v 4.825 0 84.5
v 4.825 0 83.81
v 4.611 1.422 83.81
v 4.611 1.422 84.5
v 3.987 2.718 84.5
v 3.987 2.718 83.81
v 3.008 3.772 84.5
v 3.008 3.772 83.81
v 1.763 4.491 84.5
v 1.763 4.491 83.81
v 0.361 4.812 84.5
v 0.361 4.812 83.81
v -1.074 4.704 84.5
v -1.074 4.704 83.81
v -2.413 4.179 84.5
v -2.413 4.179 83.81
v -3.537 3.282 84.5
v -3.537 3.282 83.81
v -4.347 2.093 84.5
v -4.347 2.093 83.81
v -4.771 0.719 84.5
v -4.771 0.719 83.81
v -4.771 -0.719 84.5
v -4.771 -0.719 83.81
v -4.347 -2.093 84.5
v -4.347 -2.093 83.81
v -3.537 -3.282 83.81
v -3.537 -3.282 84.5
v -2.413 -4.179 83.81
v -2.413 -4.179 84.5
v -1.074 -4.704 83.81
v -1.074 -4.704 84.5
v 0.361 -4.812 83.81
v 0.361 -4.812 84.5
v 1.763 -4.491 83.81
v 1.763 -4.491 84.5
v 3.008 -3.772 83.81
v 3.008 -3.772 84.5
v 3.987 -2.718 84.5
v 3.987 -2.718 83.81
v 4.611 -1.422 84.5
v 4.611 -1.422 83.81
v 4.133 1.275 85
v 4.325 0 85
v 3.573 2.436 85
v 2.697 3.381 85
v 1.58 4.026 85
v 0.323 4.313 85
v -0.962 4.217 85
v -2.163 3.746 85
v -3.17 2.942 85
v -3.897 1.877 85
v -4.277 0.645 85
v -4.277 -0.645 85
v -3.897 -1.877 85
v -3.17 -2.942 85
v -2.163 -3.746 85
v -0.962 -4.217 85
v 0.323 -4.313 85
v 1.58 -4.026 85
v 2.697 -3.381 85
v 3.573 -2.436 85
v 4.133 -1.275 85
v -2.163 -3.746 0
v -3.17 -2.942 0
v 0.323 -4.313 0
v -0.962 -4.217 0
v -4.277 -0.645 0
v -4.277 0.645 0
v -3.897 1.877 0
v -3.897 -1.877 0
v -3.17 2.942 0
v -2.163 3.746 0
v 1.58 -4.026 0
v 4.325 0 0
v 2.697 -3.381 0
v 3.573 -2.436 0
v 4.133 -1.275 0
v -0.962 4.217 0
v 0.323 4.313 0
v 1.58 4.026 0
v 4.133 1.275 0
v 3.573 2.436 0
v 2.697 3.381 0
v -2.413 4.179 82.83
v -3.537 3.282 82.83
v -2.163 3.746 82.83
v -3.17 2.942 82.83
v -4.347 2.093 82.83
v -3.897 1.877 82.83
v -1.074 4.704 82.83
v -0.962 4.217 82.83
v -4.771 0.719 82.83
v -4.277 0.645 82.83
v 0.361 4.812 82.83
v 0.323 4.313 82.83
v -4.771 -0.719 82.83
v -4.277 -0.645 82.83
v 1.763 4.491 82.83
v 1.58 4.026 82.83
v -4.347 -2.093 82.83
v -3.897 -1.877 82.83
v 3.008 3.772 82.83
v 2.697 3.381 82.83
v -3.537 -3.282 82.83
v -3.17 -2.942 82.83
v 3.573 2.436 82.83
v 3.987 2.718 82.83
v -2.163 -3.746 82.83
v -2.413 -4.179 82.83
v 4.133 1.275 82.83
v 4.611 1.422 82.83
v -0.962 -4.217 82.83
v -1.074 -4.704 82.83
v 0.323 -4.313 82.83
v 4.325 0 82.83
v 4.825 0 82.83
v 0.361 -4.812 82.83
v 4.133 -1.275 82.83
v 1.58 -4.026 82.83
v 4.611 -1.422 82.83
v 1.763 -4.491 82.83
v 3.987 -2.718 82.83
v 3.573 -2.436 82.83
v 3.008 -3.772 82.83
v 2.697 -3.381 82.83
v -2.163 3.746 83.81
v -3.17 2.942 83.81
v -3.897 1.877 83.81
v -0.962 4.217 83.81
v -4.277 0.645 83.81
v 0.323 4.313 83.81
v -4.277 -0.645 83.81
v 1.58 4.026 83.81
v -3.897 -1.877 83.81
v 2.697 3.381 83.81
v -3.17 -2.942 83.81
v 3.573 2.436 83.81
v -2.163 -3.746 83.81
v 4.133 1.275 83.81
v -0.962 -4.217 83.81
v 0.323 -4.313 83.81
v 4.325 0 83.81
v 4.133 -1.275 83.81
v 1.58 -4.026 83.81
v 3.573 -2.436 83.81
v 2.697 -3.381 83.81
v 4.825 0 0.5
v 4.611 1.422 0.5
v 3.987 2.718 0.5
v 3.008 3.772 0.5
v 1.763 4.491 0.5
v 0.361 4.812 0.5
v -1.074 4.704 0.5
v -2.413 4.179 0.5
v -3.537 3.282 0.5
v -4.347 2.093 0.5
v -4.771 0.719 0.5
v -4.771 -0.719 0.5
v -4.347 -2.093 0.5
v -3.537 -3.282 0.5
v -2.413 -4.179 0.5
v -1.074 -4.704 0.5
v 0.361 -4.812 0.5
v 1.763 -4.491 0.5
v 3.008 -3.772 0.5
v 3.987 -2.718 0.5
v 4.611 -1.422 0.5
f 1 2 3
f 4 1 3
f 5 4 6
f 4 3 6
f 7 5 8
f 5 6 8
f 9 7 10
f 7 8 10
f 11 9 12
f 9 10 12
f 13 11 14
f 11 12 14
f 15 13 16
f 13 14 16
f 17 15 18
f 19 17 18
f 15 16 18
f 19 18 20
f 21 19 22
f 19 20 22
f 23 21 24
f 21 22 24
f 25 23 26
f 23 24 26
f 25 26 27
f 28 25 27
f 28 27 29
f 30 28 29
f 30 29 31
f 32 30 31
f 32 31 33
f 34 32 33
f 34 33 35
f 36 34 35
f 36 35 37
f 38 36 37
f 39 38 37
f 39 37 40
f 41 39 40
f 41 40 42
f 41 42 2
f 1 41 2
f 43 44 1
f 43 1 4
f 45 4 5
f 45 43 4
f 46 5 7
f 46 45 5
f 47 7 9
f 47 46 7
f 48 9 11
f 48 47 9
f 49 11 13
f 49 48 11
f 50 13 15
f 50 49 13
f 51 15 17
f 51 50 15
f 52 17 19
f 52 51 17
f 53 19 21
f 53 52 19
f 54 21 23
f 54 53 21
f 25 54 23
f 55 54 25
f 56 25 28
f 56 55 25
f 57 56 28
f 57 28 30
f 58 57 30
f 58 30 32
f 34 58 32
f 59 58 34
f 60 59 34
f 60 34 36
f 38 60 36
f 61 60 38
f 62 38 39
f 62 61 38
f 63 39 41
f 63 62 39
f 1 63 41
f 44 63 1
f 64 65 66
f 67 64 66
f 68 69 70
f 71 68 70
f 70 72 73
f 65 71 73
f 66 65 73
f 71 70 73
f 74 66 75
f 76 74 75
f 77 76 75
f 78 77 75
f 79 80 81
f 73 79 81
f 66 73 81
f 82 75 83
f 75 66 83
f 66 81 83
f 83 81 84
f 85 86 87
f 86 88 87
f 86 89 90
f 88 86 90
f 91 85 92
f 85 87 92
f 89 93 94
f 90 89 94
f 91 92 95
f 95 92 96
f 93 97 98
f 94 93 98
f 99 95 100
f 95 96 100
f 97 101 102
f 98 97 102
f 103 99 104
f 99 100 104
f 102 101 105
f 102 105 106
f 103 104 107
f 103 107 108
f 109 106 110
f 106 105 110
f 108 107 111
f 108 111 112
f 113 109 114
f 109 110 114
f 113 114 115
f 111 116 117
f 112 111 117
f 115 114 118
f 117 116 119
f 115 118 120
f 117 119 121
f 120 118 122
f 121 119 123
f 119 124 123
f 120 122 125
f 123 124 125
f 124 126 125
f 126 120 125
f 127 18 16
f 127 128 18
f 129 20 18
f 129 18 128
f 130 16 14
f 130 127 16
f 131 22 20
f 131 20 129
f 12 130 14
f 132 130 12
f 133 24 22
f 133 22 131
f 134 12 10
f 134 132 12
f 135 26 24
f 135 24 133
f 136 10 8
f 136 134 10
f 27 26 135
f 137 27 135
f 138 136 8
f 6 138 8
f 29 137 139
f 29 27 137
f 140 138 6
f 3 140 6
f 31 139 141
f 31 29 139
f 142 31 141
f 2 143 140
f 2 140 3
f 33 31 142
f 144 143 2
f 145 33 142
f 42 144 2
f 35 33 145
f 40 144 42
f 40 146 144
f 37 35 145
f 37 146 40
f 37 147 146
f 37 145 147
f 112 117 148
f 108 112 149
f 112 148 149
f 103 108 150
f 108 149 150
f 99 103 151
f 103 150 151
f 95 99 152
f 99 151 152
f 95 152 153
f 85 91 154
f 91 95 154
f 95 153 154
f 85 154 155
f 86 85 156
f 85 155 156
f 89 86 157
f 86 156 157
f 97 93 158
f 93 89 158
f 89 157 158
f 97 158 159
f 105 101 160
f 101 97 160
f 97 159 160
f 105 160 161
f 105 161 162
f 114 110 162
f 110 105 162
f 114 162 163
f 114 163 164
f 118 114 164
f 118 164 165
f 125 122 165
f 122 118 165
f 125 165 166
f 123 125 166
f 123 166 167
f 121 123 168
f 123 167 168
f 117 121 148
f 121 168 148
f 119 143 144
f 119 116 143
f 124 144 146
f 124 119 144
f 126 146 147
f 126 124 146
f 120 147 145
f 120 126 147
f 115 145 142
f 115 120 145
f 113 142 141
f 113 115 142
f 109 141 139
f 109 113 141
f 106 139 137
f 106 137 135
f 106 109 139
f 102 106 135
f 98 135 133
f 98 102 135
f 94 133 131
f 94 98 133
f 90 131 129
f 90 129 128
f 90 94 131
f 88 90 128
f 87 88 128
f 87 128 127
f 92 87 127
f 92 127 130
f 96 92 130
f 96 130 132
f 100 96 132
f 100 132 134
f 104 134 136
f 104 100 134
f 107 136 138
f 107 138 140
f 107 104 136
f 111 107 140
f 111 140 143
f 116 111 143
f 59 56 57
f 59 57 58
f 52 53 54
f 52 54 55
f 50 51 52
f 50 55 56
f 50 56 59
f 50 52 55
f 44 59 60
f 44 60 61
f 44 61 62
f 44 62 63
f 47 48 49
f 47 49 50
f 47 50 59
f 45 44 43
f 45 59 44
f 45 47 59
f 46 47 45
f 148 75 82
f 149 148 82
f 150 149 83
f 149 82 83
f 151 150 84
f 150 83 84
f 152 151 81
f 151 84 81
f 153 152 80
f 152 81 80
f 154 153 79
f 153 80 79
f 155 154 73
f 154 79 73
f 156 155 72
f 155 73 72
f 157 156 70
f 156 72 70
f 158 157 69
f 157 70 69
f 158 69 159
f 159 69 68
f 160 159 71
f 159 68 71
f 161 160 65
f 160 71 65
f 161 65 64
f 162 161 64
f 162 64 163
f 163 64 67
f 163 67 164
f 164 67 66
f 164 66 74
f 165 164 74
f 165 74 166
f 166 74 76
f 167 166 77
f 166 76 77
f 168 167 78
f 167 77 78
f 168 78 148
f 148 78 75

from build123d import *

# Parameters (mm, degrees)
SKETCH1_R           = 4.825
BOSS_EXTRUDE1_DEPTH = 85
CHAMFER1_SIZE       = 0.5
CHAMFER2_SIZE       = 0.5
SKETCH2_W           = 0.5
SKETCH2_H           = 0.98


with BuildPart() as part:
    # Sketch1 → Boss-Extrude1 (new body)
    with BuildSketch(Plane.XY):
        Circle(SKETCH1_R)
    extrude(amount=BOSS_EXTRUDE1_DEPTH)

    # Chamfer1
    chamfer1_edges = [part.edges().sort_by_distance(p)[0] for p in [
        (-4.825, 0, 85),
    ]]
    chamfer(chamfer1_edges, length=CHAMFER1_SIZE)

    # Chamfer2
    chamfer2_edges = [part.edges().sort_by_distance(p)[0] for p in [
        (-4.825, 0, 0),
    ]]
    chamfer(chamfer2_edges, length=CHAMFER2_SIZE)

    # Sketch2 → Cut-Revolve1 (revolve, cut)
    with BuildSketch(Plane(origin=(0, 0, 0), x_dir=(1, 0, 0), z_dir=(0, 1, 0)), mode=Mode.PRIVATE) as cut_revolve1_sk:
        with Locations((-4.575, -83.32)):
            Rectangle(SKETCH2_W, SKETCH2_H)
    revolve(cut_revolve1_sk.sketch.rotate(Axis((0, 0, 85), (0, 0, -1)), 180), axis=Axis((0, 0, 85), (0, 0, -1)), mode=Mode.SUBTRACT)


solid = part.part
